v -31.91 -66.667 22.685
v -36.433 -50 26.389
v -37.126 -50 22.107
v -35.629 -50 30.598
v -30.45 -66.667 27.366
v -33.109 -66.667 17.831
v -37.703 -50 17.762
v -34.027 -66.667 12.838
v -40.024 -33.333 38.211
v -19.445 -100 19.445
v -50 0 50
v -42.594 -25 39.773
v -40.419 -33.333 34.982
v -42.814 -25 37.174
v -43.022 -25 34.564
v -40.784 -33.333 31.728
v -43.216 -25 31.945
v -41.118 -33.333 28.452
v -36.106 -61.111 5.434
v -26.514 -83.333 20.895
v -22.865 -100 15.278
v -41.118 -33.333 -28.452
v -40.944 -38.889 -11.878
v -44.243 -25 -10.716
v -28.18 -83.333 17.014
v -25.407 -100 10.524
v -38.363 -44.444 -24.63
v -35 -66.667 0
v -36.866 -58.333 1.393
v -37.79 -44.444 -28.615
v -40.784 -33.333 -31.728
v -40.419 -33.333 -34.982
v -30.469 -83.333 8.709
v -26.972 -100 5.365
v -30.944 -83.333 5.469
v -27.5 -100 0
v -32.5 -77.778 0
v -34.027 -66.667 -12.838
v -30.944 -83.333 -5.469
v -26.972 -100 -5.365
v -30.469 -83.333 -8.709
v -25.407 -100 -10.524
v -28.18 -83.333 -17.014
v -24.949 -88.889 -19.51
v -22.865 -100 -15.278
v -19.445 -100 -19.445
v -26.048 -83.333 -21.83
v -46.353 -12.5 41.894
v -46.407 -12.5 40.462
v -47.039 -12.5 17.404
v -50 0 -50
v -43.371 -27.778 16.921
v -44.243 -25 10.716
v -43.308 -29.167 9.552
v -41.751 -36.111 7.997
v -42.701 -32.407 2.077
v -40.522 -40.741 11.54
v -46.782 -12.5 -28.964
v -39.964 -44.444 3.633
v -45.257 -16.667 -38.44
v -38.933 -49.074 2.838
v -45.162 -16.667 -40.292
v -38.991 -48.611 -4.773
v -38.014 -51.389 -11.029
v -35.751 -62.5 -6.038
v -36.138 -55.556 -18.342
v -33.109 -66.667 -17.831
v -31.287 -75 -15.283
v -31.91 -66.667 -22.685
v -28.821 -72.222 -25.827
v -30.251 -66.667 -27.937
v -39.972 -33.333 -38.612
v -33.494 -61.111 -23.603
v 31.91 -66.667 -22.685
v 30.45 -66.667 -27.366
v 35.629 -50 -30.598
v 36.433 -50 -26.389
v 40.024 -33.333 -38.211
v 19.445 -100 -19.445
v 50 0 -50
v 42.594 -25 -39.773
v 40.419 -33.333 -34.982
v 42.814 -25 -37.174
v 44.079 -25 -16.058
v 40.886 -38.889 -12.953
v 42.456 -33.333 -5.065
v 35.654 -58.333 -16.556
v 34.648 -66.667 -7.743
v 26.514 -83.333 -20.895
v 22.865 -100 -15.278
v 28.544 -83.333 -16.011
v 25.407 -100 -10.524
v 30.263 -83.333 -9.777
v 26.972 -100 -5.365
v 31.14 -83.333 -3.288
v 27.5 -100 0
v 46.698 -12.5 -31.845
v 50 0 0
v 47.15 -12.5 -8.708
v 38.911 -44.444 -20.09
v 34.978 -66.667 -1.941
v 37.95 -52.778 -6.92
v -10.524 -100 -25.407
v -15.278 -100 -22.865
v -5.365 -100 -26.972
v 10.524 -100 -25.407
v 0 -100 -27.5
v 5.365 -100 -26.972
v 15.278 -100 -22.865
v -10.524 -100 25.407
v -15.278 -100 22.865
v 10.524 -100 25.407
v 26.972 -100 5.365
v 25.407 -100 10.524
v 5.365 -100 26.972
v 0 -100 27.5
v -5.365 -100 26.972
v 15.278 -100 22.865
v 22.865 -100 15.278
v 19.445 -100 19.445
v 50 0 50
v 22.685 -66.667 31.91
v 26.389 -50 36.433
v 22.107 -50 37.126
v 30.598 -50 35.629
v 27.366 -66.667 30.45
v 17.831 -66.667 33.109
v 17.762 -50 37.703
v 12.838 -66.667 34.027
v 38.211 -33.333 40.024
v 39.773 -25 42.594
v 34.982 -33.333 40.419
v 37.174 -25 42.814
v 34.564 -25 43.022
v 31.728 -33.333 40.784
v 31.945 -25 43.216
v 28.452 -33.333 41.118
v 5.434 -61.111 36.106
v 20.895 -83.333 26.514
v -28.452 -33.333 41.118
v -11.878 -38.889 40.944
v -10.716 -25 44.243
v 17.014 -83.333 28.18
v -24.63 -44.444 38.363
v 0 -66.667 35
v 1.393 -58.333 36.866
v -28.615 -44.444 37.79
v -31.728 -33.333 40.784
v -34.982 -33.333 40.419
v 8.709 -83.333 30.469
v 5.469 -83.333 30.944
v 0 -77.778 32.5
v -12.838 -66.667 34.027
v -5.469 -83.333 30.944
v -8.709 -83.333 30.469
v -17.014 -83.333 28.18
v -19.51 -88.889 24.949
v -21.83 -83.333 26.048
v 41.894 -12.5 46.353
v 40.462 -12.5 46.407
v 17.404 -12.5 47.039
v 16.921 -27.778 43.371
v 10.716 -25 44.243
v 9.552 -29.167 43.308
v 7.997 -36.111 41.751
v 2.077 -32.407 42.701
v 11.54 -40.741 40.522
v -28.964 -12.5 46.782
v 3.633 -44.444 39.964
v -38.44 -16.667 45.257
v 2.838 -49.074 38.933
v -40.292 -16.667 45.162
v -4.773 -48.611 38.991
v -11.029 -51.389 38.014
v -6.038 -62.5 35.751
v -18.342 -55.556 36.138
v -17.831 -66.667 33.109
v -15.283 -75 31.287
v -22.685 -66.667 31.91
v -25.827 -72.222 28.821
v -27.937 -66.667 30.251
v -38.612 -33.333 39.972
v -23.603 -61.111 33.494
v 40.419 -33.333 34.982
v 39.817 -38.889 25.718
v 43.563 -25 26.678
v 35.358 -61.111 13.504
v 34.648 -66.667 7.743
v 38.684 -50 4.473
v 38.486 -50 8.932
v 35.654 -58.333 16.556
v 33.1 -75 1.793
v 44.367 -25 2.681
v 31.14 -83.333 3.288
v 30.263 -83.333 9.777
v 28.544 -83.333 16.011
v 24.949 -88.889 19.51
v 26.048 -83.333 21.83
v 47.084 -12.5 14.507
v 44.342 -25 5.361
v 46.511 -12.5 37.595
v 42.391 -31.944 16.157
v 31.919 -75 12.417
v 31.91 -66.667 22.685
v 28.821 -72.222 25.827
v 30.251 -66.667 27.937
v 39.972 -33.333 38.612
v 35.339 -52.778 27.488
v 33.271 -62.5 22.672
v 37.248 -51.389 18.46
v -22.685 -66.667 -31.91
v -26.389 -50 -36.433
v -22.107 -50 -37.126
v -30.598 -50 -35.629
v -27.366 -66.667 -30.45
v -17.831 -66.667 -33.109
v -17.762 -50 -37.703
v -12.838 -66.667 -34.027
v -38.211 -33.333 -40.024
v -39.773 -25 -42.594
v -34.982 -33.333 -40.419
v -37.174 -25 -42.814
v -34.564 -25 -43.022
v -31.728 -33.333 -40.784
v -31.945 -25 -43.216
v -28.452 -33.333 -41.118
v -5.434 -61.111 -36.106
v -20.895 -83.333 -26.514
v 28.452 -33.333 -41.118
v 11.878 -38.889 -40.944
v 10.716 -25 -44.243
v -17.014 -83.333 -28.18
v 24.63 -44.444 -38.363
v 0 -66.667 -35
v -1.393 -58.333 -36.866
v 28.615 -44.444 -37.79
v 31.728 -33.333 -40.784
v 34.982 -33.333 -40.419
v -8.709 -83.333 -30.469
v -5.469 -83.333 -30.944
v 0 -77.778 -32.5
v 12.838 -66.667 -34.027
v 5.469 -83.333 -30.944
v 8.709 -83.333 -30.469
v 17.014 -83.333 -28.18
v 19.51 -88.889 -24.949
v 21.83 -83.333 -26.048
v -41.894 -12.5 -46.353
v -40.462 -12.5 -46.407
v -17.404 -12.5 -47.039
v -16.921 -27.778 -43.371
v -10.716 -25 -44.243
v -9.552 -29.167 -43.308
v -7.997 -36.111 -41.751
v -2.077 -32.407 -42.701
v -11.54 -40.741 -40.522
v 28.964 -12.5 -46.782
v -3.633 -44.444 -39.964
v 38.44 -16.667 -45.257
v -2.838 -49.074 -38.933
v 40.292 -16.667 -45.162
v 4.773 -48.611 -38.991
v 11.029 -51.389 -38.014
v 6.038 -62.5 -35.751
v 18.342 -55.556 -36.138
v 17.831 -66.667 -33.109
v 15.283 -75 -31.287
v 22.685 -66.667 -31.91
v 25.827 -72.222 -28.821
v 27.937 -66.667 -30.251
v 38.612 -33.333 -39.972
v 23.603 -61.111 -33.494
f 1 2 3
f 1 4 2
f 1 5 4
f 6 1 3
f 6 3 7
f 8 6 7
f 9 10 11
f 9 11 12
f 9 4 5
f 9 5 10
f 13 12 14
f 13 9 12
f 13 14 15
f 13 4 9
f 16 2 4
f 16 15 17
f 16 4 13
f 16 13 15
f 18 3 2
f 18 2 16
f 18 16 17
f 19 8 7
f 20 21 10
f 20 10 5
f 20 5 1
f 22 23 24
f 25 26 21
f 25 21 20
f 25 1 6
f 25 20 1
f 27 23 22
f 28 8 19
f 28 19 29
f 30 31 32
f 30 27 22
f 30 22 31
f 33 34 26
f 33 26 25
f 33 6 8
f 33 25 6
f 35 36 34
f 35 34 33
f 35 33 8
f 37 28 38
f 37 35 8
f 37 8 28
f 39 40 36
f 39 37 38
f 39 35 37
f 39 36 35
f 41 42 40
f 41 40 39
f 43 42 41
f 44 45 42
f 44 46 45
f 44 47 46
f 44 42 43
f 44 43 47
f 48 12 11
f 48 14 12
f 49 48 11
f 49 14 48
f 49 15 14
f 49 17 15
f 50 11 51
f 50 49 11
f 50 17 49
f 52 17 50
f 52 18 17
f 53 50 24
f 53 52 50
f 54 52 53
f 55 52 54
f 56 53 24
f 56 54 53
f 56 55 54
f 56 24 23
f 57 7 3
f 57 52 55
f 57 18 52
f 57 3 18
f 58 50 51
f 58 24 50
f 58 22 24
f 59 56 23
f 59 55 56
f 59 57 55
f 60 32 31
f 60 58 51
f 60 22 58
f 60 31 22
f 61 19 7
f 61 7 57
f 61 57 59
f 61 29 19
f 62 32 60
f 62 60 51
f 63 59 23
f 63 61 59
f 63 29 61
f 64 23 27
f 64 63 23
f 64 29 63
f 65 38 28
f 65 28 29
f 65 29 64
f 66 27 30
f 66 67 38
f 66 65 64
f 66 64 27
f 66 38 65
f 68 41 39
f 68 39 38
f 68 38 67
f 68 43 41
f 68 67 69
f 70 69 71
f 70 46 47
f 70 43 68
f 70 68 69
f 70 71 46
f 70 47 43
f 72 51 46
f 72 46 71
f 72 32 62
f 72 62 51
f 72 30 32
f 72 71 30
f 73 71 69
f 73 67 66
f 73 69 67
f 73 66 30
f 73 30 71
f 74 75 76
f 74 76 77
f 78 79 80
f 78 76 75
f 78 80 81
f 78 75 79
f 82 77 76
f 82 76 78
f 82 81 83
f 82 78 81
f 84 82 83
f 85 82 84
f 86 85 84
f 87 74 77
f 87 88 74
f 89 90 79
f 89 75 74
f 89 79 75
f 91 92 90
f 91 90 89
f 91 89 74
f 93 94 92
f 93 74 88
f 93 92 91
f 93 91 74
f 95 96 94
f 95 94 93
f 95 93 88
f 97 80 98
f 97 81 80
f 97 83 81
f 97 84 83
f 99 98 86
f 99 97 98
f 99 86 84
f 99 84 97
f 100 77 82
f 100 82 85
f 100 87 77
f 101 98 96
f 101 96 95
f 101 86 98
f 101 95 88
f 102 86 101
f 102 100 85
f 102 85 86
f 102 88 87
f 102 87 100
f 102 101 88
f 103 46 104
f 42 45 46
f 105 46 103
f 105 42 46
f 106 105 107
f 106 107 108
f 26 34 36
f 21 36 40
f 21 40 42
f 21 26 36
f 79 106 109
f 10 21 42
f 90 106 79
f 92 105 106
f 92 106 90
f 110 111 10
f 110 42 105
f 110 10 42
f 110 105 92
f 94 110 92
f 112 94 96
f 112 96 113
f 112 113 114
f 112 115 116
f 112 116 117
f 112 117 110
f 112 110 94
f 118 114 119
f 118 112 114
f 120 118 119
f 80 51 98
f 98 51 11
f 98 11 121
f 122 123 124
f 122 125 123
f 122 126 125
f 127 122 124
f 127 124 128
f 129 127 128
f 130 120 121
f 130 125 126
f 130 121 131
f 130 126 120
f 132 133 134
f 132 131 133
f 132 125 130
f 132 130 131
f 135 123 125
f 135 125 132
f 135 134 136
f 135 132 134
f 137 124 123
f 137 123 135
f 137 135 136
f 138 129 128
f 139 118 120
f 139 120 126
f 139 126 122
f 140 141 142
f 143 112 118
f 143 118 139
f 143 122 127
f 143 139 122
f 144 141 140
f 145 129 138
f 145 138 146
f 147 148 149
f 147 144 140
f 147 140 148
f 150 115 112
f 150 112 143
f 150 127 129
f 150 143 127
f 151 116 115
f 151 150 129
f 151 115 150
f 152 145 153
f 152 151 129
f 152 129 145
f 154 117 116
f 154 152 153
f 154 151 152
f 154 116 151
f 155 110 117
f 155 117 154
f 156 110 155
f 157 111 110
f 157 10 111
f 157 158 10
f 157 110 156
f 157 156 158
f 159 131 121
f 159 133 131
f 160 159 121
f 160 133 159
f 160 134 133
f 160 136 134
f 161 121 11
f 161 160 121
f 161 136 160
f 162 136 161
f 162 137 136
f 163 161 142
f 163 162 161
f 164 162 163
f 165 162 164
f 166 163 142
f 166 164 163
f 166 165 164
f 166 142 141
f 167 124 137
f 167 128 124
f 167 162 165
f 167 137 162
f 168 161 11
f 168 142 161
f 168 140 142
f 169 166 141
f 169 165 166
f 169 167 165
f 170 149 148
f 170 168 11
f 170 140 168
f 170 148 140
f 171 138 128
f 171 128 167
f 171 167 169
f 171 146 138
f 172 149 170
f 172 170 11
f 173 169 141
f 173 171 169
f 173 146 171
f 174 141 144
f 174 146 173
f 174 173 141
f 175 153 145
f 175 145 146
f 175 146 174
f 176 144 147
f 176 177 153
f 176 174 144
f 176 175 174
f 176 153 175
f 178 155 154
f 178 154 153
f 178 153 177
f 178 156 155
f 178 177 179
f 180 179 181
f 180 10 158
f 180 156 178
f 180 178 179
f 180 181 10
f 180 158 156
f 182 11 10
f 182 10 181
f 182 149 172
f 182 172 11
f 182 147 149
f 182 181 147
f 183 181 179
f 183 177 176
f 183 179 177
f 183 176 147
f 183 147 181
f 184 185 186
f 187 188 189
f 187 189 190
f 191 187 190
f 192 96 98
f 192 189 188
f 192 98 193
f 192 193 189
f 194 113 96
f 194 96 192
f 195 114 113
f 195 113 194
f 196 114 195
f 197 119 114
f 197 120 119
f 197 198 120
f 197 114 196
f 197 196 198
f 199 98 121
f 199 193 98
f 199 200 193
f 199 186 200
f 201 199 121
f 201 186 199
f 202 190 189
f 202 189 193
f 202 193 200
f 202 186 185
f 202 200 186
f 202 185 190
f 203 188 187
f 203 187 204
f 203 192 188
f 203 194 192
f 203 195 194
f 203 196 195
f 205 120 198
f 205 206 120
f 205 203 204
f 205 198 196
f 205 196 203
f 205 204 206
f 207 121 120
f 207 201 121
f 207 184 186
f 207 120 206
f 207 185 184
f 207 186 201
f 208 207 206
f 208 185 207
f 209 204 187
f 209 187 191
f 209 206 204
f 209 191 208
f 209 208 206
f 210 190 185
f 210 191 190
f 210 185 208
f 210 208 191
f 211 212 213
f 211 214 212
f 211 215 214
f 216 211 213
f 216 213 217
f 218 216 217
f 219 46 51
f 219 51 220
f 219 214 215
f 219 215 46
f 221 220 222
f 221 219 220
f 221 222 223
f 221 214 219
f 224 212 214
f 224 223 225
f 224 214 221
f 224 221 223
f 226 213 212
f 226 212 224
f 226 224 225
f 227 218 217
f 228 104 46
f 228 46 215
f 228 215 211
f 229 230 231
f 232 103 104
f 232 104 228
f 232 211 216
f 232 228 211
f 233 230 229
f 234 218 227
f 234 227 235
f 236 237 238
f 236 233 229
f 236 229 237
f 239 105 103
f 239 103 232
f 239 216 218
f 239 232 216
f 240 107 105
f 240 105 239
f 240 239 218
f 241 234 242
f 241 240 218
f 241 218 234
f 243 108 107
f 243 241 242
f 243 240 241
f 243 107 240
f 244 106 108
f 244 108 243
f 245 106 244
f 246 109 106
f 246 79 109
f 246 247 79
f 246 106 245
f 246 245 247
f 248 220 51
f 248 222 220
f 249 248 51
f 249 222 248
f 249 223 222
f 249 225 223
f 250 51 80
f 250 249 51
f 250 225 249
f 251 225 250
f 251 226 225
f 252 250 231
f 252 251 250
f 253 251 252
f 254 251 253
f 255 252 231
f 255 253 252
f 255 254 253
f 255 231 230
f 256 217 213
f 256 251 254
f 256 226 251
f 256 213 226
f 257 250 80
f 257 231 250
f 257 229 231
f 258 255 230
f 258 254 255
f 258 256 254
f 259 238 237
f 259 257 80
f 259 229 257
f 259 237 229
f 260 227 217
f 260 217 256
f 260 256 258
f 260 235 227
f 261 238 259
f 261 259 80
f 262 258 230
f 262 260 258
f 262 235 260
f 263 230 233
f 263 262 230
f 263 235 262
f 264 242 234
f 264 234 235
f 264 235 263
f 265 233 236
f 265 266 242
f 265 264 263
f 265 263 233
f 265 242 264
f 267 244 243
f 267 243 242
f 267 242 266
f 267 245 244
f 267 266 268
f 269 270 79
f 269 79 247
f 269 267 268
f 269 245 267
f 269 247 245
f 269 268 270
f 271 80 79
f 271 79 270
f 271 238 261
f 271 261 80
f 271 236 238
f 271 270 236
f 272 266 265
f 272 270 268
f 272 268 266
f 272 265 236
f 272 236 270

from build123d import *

# Parameters (mm, degrees)
F0_W = 100
F0_H = 100
F2_R = 27.5


with BuildPart() as f3:
    # F0 (on Front) → F3 section 0
    with BuildSketch(Plane.XZ):
        Rectangle(F0_W, F0_H)
    # F2 (on offset) → F3 section 1
    with BuildSketch(Plane.XZ.offset(100)):
        Circle(F2_R)
    loft()


solid = f3.part
